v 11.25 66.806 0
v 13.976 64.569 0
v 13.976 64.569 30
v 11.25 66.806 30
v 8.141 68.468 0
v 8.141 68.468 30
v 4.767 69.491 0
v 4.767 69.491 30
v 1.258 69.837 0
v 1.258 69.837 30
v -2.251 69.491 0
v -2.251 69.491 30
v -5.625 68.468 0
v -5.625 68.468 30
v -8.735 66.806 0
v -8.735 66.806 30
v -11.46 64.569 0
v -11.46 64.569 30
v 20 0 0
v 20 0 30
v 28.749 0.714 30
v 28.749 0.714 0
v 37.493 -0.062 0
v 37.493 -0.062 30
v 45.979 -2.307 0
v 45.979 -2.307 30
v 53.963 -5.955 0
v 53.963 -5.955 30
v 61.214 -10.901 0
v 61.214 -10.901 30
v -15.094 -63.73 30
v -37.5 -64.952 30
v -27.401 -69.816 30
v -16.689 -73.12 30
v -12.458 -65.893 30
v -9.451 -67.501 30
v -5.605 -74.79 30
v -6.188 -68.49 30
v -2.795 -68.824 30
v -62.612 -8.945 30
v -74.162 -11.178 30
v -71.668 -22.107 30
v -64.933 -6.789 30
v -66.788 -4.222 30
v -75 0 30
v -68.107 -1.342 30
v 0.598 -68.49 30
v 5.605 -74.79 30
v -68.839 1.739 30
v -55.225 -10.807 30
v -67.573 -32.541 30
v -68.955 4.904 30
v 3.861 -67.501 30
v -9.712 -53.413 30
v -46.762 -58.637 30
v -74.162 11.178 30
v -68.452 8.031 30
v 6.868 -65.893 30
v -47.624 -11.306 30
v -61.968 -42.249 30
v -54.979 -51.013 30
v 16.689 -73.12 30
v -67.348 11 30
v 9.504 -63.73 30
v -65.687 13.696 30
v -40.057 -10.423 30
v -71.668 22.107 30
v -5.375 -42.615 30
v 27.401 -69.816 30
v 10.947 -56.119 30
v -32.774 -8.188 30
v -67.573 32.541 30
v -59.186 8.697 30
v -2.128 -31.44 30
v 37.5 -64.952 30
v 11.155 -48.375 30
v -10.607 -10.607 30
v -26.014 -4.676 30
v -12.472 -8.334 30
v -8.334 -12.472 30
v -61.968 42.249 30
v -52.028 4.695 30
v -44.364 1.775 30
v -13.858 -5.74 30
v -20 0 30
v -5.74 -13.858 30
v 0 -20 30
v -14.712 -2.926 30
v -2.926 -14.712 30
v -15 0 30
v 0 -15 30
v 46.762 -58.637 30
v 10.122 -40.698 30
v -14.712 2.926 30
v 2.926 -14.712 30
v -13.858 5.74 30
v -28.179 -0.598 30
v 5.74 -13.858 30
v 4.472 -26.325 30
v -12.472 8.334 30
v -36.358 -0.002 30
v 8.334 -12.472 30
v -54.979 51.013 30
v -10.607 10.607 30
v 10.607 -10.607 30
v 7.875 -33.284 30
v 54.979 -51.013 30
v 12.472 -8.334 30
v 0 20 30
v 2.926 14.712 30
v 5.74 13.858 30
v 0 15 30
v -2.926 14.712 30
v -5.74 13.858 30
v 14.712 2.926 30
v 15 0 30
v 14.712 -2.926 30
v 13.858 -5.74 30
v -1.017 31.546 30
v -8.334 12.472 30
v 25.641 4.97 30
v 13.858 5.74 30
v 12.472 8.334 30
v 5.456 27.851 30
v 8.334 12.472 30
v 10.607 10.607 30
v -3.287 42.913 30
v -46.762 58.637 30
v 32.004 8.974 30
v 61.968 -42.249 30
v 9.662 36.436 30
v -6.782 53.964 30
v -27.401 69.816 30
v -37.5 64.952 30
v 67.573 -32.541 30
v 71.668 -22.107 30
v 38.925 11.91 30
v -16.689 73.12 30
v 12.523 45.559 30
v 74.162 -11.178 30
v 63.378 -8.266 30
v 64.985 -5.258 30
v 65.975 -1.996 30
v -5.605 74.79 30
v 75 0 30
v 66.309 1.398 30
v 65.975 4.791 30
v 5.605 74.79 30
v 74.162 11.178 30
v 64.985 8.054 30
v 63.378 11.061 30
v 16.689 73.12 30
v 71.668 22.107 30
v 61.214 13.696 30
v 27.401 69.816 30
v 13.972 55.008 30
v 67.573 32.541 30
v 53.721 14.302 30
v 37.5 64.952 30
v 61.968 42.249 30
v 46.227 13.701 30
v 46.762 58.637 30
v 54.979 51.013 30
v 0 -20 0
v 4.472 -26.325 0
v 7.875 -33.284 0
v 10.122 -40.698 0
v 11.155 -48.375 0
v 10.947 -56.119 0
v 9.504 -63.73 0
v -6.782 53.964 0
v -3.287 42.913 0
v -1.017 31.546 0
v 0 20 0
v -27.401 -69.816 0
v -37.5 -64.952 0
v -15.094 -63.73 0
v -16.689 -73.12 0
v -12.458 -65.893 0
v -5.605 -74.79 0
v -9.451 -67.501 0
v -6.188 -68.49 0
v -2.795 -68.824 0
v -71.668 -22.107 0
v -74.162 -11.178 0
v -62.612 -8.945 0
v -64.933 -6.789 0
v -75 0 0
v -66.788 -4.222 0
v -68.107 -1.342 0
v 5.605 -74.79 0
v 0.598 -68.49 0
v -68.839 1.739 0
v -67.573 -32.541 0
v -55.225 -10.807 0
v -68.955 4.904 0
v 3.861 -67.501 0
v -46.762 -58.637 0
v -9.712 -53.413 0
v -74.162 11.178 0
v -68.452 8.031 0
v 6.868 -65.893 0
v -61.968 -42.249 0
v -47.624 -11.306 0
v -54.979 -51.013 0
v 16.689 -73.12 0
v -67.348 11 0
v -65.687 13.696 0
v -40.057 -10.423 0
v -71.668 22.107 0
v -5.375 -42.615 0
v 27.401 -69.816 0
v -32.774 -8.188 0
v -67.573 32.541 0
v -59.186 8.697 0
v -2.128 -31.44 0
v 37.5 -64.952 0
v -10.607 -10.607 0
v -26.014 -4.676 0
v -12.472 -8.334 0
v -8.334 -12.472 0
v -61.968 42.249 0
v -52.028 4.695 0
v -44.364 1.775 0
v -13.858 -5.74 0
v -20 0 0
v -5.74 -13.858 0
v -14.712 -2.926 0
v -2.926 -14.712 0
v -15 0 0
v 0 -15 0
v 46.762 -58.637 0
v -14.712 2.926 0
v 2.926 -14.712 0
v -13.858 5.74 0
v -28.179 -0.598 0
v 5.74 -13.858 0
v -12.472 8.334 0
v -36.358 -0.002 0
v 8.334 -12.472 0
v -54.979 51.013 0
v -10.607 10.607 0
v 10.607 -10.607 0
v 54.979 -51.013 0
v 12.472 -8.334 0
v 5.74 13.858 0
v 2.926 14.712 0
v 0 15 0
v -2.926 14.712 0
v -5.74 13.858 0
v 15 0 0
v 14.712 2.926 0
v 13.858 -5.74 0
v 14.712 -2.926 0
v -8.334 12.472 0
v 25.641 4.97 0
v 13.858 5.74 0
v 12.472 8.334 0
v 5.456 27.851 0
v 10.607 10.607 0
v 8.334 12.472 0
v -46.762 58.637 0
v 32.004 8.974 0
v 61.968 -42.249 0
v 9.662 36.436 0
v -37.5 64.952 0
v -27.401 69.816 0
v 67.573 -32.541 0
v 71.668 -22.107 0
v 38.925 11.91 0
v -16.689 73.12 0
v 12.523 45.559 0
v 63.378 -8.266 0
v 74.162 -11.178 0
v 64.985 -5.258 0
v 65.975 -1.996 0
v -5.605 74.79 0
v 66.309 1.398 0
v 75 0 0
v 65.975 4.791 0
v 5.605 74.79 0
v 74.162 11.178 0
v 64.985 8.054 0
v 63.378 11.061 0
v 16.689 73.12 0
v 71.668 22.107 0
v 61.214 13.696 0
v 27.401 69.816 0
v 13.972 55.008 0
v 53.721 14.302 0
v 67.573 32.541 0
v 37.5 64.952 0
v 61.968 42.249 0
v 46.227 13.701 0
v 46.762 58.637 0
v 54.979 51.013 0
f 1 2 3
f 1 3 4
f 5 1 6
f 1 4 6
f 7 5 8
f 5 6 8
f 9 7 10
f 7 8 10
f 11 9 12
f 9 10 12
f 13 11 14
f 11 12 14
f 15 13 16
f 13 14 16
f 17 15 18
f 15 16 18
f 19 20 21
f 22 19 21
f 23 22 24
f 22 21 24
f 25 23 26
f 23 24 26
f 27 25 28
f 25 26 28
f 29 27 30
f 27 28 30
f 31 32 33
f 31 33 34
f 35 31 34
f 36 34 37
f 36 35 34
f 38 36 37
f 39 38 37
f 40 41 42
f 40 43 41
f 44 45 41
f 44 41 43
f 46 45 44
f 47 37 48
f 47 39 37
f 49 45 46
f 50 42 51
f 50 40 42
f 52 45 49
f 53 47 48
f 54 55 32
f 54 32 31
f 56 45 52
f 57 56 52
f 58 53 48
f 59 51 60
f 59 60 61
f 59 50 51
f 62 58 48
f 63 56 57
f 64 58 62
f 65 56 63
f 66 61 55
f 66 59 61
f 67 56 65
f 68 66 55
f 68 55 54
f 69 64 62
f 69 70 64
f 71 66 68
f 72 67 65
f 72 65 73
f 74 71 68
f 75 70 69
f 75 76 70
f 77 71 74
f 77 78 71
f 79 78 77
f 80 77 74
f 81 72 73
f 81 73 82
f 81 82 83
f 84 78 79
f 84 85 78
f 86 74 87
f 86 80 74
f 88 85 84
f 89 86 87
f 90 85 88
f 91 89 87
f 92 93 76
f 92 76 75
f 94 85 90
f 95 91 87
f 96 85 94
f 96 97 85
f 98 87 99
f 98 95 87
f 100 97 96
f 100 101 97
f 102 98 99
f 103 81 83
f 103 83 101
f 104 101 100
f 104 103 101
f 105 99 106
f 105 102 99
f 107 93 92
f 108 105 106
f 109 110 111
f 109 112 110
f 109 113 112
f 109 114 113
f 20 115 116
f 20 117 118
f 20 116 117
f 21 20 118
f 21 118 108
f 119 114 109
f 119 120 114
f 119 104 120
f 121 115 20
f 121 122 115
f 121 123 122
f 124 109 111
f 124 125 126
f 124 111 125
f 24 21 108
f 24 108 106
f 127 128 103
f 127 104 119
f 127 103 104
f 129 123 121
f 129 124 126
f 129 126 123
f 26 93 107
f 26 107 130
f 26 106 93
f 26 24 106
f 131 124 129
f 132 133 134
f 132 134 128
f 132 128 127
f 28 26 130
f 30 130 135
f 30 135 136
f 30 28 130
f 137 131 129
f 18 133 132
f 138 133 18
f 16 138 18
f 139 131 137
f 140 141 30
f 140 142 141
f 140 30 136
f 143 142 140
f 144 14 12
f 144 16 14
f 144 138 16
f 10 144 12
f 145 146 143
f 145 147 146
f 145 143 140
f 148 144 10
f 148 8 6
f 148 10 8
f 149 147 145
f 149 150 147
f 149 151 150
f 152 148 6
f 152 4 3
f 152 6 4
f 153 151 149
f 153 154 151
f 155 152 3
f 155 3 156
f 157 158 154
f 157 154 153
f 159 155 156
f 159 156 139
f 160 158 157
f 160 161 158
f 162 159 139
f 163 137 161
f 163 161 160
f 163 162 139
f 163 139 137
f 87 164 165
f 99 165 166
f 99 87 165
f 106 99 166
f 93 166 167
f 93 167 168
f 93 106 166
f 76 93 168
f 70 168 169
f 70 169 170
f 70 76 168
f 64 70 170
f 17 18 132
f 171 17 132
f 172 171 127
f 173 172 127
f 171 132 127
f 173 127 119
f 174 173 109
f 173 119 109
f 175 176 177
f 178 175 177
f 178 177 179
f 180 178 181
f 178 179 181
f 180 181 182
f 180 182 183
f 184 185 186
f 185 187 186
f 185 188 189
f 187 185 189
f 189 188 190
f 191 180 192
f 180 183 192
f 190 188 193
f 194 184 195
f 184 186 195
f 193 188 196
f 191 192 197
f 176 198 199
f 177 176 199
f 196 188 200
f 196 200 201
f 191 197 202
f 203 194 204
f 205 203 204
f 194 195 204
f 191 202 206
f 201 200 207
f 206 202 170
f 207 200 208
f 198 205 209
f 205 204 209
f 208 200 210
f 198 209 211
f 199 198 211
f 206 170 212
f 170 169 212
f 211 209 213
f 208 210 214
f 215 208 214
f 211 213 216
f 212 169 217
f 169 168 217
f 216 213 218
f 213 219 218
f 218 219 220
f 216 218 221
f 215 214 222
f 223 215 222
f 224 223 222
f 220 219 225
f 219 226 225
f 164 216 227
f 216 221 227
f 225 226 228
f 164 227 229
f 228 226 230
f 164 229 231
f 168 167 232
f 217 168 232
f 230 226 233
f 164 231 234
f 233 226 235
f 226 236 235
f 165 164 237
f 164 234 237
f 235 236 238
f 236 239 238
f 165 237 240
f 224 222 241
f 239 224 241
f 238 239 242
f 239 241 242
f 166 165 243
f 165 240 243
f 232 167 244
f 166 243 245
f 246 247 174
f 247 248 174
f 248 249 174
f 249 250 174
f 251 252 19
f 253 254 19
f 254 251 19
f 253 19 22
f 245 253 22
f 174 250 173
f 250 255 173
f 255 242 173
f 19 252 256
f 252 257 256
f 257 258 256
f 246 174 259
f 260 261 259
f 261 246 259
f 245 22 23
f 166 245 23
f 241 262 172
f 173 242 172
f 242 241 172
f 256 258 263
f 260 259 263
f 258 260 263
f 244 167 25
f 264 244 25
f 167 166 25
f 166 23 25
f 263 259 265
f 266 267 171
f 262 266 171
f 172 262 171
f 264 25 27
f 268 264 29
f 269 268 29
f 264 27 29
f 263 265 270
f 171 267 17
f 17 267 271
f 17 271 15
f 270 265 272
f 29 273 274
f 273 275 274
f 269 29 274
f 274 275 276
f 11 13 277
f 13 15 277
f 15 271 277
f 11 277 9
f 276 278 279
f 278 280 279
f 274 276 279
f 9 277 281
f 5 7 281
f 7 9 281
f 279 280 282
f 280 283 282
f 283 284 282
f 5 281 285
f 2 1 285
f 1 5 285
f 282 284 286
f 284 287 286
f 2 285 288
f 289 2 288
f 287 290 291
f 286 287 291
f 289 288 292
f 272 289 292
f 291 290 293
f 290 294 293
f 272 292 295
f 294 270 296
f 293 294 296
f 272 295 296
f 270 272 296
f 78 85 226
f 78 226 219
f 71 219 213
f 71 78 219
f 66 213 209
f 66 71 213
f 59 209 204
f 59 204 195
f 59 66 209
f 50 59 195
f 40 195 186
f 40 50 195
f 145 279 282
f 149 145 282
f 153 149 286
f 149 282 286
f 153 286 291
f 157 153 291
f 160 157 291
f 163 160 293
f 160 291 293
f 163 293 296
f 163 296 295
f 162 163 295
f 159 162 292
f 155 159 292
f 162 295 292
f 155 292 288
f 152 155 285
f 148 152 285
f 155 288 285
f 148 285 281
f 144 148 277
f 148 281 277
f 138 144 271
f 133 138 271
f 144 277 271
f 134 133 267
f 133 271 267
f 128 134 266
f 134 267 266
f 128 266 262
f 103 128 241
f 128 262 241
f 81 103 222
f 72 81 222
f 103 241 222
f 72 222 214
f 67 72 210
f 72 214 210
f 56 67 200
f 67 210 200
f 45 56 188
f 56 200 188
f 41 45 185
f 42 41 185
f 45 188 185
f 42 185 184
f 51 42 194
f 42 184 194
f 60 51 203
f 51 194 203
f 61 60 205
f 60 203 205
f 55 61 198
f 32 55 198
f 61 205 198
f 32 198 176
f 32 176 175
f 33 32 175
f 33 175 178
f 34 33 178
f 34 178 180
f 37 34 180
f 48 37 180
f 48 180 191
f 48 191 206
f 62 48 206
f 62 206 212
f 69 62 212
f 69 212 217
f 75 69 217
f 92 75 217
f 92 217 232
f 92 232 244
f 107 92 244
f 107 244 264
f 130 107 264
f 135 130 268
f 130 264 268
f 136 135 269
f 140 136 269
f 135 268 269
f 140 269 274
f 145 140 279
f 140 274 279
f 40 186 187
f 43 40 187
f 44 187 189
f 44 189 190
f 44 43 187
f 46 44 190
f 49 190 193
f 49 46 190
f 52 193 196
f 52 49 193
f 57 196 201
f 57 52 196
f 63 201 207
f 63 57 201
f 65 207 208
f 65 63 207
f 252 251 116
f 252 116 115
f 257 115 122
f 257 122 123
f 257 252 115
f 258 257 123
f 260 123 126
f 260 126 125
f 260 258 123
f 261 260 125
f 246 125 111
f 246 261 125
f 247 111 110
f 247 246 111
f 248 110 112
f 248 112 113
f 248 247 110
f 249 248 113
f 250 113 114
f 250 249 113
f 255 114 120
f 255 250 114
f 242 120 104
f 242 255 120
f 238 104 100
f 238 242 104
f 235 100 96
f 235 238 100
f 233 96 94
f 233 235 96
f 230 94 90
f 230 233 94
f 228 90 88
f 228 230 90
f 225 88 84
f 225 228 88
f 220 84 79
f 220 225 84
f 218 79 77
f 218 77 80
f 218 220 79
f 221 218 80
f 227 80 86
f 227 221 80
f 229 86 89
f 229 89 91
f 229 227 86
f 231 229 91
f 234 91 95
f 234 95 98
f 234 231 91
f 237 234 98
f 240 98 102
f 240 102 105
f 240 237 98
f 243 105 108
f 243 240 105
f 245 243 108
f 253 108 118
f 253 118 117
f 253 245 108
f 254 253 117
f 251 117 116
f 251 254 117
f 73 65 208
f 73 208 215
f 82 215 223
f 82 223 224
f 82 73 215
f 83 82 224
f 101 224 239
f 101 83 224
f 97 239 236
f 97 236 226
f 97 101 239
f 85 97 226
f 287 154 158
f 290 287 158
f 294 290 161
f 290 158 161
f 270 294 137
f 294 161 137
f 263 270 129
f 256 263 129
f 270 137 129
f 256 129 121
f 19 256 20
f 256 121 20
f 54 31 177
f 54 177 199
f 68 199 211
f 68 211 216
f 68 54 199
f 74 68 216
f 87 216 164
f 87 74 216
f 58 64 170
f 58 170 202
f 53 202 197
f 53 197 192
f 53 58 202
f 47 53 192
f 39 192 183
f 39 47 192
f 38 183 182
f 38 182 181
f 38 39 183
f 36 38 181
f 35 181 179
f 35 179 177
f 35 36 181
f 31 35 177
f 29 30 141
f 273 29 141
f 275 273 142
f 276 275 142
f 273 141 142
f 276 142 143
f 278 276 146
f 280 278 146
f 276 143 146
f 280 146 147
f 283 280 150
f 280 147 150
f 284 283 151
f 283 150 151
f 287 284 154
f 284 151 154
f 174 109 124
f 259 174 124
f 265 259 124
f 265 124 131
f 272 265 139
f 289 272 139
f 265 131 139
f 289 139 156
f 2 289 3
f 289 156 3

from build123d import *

# Parameters (mm, degrees)
SKETCH1_R           = 75
SKETCH1_R_2         = 15
BOSS_EXTRUDE1_DEPTH = 30
CUT_EXTRUDE1_DEPTH  = 30


with BuildPart() as part:
    # Sketch1 → Boss-Extrude1 (new body)
    with BuildSketch(Plane.XY):
        Circle(SKETCH1_R)
        Circle(SKETCH1_R_2, mode=Mode.SUBTRACT)
    extrude(amount=BOSS_EXTRUDE1_DEPTH)

    # Sketch3 → Cut-Extrude1 (cut)
    with BuildSketch(Plane.XY.offset(30)):
        with BuildLine():
            ThreePointArc((20, 0), (41.783391285, -1.00391685), (61.214489176, -10.901210401))
            ThreePointArc((61.214489176, -10.901210401), (66.308819549, 1.397591077), (61.214489176, 13.696392555))
            ThreePointArc((61.214489176, 13.696392555), (38.925210815, 11.909686918), (20, 0))
        make_face()
        with BuildLine():
            ThreePointArc((0, 20), (11.265284699, 40.943063639), (13.975910771, 64.568707761))
            ThreePointArc((13.975910771, 64.568707761), (1.257831969, 69.836708488), (-11.460246832, 64.568707761))
            ThreePointArc((-11.460246832, 64.568707761), (-3.286702106, 42.912646975), (0, 20))
        make_face()
        with BuildLine():
            ThreePointArc((-20, 0), (-40.056959125, -10.422925538), (-62.612080253, -8.944582893))
            ThreePointArc((-62.612080253, -8.944582893), (-68.838529986, 1.739113534), (-65.686780623, 13.696392555))
            ThreePointArc((-65.686780623, 13.696392555), (-44.364425117, 1.774511129), (-20, 0))
        make_face()
        with BuildLine():
            ThreePointArc((0, -20), (10.122111276, -40.697980205), (9.503619324, -63.730153115))
            ThreePointArc((9.503619324, -63.730153115), (-2.795182154, -68.824483488), (-15.093983632, -63.730153115))
            ThreePointArc((-15.093983632, -63.730153115), (-5.375443737, -42.614612263), (0, -20))
        make_face()
    extrude(amount=-CUT_EXTRUDE1_DEPTH, mode=Mode.SUBTRACT)


solid = part.part
